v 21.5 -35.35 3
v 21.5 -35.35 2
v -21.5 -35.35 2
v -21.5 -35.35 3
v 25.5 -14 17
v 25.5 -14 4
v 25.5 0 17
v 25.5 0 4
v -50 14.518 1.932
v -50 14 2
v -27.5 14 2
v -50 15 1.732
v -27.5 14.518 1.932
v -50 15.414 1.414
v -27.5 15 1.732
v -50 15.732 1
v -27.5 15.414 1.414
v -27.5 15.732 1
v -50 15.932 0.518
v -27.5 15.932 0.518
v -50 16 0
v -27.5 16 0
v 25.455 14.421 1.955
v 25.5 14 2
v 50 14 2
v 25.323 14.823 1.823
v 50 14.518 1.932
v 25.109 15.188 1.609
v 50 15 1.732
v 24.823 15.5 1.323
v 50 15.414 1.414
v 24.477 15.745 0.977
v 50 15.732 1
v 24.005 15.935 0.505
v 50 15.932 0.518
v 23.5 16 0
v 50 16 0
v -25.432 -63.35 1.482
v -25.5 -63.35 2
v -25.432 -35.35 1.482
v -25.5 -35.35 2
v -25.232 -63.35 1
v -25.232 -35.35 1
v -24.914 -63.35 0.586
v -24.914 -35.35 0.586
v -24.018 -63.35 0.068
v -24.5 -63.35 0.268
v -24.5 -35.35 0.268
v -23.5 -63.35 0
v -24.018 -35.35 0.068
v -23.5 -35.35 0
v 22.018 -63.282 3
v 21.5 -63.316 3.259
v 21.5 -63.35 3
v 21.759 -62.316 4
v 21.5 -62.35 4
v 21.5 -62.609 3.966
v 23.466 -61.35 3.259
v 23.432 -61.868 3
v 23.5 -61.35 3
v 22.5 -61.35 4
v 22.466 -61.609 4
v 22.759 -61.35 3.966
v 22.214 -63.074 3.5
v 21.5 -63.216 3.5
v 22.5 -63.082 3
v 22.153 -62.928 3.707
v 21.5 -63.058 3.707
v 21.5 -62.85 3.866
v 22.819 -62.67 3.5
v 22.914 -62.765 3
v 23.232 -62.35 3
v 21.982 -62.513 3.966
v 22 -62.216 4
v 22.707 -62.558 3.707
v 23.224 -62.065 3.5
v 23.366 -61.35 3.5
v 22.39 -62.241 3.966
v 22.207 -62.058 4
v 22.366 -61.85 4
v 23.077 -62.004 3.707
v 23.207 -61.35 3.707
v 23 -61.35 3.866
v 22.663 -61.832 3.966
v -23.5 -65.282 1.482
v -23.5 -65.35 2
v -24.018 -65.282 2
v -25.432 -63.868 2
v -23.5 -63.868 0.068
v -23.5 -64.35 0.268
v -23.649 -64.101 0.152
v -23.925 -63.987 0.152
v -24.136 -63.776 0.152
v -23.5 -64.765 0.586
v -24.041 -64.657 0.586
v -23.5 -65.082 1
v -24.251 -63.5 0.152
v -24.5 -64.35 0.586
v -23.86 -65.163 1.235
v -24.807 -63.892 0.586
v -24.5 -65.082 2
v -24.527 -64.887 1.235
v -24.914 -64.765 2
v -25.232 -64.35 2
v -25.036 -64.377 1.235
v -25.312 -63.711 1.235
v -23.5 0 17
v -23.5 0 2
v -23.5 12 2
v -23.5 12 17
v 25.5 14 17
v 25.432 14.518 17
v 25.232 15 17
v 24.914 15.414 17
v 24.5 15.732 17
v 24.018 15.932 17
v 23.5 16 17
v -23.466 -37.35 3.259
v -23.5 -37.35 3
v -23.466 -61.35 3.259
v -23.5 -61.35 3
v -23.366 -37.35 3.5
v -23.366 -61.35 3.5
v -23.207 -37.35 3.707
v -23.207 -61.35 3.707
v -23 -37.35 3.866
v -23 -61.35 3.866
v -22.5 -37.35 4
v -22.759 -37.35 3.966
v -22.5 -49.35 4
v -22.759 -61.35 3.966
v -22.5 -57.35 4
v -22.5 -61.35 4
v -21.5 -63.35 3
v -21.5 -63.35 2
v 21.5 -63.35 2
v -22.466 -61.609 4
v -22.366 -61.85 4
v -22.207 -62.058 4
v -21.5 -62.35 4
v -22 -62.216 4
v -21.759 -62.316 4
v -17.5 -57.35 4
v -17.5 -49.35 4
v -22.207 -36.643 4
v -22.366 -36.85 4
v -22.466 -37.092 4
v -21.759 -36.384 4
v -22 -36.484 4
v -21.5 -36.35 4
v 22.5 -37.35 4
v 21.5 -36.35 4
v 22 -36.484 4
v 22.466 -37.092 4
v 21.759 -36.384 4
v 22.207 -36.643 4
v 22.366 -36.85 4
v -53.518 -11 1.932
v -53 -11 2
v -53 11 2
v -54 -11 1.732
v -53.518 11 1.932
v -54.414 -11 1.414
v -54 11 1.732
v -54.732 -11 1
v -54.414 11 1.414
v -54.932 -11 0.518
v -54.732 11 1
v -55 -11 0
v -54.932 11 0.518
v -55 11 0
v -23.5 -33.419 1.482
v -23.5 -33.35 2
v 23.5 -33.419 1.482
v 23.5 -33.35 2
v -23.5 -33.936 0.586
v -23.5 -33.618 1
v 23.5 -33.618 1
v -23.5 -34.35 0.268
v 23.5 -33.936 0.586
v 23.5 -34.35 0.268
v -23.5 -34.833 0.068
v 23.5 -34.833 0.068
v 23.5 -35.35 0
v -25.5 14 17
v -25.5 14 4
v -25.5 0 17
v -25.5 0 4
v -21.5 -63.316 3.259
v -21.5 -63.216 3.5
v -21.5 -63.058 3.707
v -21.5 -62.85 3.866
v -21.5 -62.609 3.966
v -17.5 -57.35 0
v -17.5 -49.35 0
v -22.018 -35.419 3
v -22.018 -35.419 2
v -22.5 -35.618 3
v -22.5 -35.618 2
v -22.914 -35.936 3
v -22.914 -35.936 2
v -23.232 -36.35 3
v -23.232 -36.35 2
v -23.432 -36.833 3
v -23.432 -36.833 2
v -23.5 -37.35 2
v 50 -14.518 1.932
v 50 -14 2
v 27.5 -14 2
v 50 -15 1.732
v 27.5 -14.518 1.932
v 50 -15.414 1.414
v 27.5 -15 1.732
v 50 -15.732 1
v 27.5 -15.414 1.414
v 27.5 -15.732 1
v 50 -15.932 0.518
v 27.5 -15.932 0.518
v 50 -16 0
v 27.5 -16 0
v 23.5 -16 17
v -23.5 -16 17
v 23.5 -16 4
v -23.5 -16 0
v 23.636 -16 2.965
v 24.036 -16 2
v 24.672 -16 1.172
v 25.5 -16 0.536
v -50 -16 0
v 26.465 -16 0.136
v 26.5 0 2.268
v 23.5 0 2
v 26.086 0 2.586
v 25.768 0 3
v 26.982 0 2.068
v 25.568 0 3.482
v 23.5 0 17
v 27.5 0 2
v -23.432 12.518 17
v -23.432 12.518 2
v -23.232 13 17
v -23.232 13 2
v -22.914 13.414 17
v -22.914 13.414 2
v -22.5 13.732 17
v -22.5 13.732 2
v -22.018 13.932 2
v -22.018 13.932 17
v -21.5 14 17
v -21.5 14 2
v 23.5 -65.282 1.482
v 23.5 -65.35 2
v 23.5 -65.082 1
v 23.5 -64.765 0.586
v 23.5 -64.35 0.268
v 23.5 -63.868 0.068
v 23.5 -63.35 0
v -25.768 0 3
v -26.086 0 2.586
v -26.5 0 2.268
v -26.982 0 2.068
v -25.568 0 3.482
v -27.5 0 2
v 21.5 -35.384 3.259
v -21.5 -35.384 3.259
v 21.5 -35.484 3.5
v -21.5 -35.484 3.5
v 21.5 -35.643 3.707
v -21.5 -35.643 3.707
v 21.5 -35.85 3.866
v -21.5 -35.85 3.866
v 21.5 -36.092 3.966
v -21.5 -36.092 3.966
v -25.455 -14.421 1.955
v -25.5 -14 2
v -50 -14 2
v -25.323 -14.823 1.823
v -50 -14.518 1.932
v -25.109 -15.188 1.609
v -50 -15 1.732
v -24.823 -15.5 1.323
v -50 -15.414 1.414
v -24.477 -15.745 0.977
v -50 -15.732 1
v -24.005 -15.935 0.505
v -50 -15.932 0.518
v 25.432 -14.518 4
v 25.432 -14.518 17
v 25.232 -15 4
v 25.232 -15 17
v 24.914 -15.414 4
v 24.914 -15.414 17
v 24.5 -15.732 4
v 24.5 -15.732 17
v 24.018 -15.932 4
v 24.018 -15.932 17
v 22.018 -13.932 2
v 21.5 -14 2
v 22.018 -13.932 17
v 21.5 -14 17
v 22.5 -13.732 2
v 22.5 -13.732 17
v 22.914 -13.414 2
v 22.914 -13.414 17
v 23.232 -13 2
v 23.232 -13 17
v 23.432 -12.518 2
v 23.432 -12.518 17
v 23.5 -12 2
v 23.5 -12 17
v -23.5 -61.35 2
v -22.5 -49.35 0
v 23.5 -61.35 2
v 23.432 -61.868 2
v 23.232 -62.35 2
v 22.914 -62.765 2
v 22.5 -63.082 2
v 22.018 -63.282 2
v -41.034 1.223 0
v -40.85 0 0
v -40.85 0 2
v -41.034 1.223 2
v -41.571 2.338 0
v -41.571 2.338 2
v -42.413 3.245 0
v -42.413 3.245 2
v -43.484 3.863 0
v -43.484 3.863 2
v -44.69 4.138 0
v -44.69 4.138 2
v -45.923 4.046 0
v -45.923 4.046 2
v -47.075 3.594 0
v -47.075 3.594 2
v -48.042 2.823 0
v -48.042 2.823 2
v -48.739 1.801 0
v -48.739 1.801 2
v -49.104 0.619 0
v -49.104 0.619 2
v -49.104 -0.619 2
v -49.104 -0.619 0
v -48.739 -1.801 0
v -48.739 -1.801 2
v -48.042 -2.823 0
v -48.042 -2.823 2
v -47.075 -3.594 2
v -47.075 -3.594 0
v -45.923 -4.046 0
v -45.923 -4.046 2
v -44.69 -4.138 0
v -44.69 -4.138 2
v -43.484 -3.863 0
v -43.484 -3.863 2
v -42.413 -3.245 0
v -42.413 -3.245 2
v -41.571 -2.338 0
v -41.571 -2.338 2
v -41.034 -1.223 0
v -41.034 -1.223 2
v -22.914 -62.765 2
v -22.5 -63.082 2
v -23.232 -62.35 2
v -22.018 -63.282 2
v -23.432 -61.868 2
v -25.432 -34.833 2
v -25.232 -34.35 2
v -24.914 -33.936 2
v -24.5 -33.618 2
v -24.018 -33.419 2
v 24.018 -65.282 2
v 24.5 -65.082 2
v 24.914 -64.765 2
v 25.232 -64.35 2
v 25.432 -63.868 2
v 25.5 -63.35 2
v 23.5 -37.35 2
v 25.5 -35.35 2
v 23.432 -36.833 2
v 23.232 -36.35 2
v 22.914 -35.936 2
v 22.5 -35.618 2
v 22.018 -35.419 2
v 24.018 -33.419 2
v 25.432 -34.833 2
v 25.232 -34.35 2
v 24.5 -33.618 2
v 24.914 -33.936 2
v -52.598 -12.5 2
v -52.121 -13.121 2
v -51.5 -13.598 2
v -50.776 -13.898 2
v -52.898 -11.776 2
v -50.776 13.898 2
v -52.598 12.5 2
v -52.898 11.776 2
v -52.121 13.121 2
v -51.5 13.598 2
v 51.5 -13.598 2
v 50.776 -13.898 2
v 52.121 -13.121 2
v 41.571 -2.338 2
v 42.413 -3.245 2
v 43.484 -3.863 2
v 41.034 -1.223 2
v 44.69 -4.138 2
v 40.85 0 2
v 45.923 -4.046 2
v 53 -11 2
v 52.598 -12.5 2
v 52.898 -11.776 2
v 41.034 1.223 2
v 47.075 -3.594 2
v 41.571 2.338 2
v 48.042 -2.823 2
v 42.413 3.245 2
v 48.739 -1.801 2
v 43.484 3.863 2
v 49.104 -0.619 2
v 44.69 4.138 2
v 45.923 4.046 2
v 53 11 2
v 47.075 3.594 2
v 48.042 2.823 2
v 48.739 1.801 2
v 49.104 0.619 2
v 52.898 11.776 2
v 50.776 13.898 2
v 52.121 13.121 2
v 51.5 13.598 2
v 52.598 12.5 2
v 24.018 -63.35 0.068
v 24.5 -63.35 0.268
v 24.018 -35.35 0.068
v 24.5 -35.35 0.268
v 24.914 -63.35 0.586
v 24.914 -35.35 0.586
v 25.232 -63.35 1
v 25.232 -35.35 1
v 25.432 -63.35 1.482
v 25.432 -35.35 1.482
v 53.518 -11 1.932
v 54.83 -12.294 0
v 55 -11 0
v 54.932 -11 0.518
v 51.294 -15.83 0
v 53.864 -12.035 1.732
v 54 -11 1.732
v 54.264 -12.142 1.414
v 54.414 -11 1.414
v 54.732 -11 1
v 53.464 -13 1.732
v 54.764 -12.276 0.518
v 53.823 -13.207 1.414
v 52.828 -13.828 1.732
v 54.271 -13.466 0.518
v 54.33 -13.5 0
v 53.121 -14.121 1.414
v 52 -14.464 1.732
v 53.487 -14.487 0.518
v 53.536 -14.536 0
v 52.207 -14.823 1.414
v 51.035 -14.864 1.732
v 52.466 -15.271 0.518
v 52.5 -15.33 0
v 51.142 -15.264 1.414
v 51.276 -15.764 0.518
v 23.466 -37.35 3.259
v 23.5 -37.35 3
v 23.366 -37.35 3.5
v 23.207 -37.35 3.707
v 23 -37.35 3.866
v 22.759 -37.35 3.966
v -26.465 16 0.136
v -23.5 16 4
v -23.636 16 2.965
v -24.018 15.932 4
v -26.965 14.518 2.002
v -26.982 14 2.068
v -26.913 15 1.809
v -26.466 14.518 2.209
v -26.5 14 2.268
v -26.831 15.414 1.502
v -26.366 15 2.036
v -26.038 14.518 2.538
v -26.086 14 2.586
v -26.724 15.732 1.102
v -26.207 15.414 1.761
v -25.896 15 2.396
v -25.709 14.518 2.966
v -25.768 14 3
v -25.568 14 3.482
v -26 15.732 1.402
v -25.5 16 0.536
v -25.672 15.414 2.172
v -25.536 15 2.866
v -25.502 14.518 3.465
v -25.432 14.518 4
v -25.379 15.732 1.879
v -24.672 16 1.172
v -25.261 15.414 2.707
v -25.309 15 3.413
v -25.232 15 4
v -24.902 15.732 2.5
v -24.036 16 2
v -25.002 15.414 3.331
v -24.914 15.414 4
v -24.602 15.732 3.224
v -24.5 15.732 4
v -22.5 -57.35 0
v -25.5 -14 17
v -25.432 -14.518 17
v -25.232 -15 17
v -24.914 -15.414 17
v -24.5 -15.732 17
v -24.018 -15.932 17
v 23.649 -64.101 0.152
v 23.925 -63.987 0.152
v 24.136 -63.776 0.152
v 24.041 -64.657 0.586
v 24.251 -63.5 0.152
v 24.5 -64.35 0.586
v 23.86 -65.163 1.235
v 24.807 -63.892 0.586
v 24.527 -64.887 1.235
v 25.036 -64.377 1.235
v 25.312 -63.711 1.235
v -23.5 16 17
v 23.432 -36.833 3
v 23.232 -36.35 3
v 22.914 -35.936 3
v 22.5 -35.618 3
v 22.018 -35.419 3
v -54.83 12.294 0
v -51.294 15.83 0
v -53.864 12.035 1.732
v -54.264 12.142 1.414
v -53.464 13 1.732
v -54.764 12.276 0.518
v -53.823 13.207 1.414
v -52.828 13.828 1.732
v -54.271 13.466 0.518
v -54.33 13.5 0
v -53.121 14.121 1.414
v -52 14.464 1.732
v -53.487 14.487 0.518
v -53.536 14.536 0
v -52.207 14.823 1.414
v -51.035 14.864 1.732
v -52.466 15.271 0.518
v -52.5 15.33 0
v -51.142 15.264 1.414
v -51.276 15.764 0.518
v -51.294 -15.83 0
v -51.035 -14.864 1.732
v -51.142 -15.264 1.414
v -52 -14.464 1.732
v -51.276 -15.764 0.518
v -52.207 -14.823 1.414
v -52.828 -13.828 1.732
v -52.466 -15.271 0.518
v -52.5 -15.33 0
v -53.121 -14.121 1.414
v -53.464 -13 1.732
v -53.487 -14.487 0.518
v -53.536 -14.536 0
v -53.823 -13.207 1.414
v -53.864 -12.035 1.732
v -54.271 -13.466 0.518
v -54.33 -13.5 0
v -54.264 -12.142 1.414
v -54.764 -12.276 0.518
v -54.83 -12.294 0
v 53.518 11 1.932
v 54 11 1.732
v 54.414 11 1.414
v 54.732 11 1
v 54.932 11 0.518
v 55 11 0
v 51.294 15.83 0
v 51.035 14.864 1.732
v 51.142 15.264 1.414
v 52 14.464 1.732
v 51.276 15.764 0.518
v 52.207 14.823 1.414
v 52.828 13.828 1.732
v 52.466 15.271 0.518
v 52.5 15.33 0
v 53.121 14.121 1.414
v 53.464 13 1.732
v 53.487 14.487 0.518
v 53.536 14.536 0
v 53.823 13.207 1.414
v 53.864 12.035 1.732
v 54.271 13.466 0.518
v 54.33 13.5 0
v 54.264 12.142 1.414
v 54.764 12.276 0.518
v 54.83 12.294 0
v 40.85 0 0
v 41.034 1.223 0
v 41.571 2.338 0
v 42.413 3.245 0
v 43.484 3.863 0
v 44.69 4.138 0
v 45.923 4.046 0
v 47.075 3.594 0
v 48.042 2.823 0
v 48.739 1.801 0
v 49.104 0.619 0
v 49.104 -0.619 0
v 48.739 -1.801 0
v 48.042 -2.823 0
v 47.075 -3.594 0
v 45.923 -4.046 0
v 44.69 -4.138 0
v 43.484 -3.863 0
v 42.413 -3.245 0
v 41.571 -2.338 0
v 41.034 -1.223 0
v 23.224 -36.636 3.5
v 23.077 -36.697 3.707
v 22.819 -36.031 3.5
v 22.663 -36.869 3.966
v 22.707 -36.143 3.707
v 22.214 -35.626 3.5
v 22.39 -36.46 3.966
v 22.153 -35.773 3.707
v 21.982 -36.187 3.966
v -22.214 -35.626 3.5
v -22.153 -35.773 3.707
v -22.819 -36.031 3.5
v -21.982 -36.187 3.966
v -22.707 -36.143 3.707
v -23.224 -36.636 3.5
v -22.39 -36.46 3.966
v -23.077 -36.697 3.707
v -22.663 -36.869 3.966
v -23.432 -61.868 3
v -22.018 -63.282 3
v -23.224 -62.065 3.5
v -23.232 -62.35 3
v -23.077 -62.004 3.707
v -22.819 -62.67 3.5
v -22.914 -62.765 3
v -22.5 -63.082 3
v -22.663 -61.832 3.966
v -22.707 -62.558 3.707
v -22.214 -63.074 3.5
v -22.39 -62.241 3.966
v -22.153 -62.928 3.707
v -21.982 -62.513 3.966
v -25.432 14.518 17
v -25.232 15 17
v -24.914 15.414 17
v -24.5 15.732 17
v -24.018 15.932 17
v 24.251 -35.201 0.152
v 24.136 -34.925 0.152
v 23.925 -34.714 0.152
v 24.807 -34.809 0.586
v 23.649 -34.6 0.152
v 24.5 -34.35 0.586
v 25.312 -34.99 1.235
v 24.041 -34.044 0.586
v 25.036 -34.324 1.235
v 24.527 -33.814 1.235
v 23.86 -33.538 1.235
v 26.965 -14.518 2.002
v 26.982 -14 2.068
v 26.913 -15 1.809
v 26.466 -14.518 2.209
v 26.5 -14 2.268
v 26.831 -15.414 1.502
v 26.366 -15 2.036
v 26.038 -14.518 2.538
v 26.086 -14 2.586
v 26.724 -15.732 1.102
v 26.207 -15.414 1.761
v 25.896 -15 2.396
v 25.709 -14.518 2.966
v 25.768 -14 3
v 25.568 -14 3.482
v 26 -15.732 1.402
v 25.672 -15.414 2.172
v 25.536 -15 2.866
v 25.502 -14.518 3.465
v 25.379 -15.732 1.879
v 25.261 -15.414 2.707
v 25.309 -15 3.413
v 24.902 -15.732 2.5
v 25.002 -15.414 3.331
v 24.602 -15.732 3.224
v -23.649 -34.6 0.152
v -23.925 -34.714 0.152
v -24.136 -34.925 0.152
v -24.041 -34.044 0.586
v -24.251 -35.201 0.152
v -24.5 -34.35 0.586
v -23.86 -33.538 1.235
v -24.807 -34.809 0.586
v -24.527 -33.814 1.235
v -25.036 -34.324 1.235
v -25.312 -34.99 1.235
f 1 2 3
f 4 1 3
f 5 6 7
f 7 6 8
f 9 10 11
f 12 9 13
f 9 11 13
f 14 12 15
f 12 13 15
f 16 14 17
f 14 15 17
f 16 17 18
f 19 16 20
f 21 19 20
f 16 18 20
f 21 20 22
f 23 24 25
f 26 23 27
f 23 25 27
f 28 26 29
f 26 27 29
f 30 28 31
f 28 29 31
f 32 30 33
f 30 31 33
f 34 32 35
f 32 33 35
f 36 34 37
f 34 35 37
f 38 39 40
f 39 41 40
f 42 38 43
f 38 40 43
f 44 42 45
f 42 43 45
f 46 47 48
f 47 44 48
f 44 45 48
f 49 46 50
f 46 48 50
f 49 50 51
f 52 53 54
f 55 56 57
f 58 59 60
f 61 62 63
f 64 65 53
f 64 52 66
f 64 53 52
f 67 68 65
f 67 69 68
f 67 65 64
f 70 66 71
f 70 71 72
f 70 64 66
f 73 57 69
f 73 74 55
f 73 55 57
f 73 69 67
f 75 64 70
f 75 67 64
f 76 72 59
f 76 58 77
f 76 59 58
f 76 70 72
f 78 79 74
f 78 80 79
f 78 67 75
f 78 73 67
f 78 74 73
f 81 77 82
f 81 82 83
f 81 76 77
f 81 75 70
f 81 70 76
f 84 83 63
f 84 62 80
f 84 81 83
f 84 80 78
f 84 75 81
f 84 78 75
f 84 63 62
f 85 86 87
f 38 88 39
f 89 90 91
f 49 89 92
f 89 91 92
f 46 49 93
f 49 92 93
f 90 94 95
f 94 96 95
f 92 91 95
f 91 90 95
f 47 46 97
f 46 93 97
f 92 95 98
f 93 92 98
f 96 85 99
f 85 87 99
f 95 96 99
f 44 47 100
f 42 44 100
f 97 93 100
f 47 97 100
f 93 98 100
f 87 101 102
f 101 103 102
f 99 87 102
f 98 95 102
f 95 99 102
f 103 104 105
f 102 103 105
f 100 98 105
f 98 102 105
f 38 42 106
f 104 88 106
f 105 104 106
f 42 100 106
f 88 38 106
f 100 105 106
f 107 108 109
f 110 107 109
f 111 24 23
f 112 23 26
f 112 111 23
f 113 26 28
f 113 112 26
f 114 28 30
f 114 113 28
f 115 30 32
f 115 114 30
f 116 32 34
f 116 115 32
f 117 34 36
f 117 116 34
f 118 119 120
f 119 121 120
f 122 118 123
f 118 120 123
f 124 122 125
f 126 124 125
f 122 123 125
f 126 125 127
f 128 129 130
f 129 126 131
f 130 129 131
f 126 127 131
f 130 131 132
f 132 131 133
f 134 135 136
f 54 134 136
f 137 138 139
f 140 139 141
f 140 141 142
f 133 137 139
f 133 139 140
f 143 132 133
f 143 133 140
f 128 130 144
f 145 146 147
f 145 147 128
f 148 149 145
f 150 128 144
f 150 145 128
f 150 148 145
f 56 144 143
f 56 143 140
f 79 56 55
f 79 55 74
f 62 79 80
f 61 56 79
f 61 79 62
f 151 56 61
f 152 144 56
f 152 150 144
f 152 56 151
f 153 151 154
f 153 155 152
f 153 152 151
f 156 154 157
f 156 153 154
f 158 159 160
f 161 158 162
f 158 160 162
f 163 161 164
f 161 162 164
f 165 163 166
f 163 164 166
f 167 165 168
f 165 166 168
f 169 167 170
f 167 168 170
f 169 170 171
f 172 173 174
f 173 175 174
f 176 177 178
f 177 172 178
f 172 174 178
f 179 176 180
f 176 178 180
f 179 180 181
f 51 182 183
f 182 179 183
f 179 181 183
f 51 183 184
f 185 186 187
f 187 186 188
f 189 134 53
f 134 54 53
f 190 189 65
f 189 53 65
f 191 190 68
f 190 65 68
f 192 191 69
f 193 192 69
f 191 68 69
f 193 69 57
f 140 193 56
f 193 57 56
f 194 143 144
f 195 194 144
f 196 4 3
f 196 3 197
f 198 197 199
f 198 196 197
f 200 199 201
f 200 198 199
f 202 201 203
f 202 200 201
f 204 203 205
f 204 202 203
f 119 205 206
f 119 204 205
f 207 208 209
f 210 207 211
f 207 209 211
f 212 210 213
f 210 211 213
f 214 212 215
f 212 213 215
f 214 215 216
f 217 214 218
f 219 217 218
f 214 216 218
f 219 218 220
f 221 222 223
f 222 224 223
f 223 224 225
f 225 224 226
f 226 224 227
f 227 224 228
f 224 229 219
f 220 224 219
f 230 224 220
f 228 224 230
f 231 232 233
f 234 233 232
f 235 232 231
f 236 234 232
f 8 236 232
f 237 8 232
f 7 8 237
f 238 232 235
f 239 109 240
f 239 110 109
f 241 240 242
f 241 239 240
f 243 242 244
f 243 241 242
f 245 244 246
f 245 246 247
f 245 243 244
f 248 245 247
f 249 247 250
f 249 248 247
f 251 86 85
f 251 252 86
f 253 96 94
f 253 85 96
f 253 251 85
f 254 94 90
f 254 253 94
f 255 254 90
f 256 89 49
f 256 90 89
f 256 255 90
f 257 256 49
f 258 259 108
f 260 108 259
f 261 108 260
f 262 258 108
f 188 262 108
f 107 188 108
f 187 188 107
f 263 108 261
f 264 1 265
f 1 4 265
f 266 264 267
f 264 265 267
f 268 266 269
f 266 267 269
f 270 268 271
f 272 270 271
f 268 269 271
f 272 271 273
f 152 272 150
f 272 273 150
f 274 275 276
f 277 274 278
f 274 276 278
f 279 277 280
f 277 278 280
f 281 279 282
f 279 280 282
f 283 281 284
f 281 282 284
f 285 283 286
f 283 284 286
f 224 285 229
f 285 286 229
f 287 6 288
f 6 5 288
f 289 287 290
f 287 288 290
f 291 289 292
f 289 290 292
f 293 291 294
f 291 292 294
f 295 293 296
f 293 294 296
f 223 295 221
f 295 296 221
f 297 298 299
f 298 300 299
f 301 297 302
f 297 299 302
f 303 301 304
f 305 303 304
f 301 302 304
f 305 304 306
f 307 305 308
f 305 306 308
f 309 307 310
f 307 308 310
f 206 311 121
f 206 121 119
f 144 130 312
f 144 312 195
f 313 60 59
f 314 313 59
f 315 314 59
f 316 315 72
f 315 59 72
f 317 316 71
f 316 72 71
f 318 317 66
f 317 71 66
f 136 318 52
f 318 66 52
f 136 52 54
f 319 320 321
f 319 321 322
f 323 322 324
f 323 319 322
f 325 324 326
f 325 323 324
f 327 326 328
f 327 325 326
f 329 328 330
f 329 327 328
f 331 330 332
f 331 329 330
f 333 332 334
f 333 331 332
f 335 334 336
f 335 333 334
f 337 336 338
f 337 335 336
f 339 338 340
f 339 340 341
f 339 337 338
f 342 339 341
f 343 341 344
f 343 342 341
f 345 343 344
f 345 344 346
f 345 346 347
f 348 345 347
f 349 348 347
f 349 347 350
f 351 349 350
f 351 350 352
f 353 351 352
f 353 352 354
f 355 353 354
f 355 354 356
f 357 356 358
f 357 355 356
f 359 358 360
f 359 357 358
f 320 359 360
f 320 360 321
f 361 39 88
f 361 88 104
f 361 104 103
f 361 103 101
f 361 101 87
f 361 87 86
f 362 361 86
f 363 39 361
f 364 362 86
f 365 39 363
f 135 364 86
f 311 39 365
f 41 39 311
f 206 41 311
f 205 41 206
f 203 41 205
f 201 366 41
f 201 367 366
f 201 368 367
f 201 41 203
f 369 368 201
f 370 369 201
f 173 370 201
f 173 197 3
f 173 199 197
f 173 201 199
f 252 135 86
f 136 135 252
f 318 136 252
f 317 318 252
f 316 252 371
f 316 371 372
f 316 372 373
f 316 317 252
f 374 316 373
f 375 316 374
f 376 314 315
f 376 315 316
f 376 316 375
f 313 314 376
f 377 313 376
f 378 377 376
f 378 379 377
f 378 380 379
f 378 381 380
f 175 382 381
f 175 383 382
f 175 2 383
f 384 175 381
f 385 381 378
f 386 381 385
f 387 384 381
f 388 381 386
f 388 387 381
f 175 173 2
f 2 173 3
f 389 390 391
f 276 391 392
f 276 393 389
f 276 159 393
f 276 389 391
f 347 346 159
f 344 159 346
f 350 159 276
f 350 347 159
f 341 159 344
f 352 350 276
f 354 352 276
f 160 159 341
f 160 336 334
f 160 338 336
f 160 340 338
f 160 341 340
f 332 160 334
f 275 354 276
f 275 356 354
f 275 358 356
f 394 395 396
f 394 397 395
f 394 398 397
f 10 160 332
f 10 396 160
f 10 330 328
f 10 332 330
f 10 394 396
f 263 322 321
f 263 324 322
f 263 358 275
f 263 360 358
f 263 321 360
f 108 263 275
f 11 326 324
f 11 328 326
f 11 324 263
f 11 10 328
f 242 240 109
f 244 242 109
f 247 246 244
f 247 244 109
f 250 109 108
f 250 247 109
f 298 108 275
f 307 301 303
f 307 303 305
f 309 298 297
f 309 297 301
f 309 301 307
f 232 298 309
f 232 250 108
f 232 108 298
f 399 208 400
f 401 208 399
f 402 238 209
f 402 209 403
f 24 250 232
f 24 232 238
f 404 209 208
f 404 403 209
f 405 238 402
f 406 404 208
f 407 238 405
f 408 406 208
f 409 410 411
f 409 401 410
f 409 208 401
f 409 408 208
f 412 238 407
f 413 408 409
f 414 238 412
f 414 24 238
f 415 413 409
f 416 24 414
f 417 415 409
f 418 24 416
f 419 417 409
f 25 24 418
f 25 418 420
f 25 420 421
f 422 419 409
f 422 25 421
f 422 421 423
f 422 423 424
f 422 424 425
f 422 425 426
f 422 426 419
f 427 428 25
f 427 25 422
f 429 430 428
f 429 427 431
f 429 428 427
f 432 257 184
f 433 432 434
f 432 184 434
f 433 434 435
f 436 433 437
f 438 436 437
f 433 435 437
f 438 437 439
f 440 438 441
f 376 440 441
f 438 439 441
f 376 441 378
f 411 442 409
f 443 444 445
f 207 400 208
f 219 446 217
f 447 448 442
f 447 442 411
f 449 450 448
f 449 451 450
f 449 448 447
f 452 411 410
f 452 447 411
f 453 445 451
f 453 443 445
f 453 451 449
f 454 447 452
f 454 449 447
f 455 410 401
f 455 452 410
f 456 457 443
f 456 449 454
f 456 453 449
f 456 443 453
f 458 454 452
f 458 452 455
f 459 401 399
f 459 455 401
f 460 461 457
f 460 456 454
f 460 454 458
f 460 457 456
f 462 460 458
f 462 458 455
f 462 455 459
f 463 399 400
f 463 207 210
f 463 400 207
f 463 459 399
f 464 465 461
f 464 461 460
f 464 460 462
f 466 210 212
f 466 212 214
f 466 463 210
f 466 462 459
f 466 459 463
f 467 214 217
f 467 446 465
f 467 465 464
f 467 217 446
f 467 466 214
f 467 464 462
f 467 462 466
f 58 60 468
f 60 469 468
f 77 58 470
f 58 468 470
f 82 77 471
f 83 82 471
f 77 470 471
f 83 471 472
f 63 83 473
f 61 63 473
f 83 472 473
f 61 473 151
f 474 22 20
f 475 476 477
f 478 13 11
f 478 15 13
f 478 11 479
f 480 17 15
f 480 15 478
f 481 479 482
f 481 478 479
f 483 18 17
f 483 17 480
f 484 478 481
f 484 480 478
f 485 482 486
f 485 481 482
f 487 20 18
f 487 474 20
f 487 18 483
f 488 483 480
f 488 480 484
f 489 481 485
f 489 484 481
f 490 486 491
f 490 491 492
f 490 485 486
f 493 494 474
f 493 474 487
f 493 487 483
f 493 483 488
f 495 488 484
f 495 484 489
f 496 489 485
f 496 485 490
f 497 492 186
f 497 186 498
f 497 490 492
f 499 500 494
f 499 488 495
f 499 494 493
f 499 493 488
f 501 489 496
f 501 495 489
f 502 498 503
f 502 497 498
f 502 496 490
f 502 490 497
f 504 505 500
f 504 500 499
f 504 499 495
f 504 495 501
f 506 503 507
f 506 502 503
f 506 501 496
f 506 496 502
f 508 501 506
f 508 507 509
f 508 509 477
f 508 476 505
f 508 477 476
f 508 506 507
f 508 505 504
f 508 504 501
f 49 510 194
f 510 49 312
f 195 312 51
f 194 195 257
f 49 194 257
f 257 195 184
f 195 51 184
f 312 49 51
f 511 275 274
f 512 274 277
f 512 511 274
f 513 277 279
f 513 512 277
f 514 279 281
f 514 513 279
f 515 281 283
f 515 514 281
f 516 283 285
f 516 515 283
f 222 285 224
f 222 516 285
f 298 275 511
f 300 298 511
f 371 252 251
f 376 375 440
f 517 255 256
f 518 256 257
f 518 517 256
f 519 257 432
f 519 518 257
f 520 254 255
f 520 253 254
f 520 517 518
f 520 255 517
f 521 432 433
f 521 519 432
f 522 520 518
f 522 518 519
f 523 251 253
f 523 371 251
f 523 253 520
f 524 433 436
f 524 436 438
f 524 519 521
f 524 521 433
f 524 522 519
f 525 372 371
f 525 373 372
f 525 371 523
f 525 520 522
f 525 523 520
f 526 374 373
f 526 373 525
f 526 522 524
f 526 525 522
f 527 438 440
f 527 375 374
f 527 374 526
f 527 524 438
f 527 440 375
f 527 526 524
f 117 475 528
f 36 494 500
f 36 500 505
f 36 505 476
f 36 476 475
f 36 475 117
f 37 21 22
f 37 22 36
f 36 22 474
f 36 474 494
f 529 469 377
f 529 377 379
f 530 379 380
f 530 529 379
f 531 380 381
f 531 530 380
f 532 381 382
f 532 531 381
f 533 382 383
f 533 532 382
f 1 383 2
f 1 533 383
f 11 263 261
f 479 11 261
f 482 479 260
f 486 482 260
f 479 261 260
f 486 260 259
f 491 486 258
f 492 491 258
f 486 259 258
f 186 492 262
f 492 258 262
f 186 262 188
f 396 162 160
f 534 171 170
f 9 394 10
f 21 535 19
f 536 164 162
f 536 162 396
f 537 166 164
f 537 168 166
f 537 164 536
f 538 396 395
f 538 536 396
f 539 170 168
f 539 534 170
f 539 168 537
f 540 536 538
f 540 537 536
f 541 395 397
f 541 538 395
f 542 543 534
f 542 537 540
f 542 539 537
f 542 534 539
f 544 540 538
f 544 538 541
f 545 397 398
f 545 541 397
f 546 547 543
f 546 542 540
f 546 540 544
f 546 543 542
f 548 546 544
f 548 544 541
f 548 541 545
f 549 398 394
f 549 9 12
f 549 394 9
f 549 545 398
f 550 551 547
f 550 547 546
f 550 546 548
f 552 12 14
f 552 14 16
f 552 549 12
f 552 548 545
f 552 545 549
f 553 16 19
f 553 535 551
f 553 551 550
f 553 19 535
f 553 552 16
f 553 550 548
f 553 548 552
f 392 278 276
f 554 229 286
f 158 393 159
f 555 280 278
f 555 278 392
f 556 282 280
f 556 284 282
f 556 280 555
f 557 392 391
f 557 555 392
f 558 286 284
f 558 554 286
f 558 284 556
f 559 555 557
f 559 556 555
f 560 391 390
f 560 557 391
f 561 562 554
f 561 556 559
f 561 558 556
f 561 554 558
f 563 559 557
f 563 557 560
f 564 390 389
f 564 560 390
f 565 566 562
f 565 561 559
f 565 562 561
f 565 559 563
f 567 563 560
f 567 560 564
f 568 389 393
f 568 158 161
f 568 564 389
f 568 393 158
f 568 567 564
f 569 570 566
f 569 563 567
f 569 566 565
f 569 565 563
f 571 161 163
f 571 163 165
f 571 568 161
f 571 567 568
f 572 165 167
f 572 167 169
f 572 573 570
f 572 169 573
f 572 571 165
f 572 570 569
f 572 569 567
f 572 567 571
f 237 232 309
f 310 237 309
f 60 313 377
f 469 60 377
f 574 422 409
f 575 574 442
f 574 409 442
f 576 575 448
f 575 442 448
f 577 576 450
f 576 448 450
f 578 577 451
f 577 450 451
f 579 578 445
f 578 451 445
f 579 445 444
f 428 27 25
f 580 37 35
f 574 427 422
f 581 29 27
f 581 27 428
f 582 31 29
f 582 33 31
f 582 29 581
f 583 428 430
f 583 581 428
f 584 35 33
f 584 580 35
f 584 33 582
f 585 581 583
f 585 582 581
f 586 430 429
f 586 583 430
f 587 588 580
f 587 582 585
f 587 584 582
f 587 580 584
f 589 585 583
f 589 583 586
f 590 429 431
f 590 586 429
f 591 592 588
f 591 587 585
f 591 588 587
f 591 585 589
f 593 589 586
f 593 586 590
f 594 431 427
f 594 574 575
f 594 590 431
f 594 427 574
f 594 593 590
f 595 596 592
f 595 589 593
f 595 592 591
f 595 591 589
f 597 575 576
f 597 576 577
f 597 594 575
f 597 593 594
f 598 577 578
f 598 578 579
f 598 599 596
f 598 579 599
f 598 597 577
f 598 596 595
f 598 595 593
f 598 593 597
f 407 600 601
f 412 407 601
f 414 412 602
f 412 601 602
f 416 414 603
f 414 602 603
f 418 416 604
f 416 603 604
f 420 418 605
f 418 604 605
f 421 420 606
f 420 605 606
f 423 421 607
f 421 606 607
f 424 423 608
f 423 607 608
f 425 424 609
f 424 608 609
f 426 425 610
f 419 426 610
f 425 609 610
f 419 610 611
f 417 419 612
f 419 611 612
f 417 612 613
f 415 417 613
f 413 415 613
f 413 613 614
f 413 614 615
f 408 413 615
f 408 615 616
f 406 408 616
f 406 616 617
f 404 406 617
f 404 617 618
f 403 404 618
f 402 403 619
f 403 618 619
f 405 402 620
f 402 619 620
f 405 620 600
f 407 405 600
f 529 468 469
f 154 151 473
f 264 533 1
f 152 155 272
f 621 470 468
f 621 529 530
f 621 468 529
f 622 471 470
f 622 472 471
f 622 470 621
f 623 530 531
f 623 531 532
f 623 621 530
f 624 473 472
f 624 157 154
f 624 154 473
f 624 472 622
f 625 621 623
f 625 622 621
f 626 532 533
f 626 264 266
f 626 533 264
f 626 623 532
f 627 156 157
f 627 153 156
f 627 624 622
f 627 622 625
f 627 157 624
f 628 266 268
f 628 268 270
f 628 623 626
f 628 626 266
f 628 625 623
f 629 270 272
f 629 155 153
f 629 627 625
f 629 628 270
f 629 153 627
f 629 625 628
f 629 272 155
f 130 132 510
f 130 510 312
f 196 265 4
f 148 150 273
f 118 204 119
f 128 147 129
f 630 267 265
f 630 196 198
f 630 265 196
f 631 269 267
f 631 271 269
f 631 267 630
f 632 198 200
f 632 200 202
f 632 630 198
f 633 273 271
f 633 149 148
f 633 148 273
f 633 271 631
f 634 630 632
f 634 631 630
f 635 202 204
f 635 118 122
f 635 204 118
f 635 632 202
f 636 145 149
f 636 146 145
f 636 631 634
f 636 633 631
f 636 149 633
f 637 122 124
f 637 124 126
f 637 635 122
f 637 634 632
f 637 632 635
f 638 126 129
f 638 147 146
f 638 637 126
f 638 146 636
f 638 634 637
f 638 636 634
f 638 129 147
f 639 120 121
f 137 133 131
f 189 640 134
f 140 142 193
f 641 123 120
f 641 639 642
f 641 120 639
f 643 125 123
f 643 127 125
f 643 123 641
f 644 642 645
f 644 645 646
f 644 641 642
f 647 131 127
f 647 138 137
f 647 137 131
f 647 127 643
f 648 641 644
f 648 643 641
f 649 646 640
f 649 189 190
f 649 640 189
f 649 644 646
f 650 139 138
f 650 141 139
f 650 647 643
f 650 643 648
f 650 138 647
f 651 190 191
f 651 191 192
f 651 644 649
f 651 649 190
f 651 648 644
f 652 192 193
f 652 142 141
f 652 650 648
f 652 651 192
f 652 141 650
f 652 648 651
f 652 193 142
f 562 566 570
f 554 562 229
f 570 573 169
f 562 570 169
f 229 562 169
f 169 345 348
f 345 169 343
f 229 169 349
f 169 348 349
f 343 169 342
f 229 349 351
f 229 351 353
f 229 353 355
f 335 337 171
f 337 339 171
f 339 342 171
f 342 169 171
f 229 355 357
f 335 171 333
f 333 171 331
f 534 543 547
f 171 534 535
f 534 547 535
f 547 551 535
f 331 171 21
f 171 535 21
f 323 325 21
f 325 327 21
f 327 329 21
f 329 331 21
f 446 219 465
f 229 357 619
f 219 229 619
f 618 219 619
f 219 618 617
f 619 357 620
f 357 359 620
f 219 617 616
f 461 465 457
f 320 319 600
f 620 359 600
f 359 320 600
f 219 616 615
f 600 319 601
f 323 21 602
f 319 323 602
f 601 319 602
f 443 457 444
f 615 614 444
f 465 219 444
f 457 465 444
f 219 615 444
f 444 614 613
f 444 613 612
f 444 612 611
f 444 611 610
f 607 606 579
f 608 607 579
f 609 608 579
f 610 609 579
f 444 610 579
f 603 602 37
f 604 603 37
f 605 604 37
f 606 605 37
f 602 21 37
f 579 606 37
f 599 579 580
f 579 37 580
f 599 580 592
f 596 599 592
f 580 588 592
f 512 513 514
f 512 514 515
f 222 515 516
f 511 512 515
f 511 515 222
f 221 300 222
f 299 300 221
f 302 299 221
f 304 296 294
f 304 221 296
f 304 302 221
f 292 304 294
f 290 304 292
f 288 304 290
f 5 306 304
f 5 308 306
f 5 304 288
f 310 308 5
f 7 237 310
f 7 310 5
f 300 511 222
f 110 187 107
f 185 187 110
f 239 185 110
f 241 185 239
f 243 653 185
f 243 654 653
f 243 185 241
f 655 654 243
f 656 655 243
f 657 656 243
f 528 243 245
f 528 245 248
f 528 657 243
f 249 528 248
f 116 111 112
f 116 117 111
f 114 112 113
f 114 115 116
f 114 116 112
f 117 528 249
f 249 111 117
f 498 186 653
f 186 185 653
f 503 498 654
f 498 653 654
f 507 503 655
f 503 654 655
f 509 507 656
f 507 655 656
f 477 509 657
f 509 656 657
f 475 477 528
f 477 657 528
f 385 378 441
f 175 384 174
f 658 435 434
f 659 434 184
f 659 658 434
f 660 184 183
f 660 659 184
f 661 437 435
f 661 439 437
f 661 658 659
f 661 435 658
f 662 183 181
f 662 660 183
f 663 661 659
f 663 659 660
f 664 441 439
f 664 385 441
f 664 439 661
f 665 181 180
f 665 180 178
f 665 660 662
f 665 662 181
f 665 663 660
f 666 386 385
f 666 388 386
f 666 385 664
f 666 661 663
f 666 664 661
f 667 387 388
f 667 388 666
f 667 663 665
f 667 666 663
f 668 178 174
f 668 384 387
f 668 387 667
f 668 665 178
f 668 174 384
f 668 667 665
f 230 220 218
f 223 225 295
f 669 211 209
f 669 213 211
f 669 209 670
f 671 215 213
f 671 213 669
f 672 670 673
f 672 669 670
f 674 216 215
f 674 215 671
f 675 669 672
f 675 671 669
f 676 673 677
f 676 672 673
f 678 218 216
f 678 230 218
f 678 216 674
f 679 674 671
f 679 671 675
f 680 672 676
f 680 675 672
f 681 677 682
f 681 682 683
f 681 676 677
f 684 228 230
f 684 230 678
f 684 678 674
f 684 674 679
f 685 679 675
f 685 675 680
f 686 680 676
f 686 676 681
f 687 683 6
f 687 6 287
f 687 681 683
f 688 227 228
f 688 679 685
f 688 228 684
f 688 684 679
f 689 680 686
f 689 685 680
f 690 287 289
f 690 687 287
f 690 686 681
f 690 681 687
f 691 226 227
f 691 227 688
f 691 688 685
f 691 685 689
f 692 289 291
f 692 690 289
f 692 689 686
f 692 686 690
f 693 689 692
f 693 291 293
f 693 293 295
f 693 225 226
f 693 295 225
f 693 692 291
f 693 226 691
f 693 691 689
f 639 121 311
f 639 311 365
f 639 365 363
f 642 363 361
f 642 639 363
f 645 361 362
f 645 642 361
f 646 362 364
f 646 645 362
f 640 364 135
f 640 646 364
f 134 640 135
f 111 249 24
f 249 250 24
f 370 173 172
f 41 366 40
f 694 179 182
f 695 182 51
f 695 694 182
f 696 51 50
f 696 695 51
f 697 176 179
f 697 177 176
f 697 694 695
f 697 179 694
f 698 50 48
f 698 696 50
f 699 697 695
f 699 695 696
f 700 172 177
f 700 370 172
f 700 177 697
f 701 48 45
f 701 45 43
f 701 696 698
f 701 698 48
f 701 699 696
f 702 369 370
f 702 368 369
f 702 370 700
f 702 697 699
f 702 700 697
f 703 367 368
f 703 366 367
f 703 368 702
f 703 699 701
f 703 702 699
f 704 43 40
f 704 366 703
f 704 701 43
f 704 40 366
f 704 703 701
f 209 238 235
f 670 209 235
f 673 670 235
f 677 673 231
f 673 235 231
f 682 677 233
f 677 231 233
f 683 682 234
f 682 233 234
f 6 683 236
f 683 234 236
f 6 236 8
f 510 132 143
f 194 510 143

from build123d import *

# Parameters (mm, degrees)
F0_W      = 110
F0_H      = 32
F0_R      = 4.15
F1_DEPTH  = 2
F2_W      = 23.5
F2_H      = 2
F3_DEPTH  = 15
F4_W      = 14
F4_H      = 15
F5_DEPTH  = 2
F6_W      = 14
F6_H      = 15
F7_DEPTH  = 2
F8_R      = 5
F9_F1_R   = 2
F9_F2_R   = 1.9999
F10_W     = 51
F10_H     = 32
F10_W_2   = 47
F10_H_2   = 28
F11_DEPTH = 2
F12_W     = 23.5
F12_H     = 28
F13_DEPTH = 2
F14_R     = 1.99999
F15_R     = 1
F16_W     = 5
F16_H     = 8
F17_DEPTH = 25


# Not quite as in the source:
# - a fillet or chamfer is up to 0.001 mm smaller than in the source, because OpenCascade refuses the exact size


with BuildPart() as f1:
    # F0 (on Top) → F1 (new body)
    with BuildSketch(Plane.XY):
        Rectangle(F0_W, F0_H)
        with Locations((-45, 0)):
            Circle(F0_R, mode=Mode.SUBTRACT)
        with BuildLine():
            ThreePointArc((49.15, 0), (45, -4.15), (40.85, 0))
            ThreePointArc((40.85, 0), (45, 4.15), (49.15, 0))
        make_face(mode=Mode.SUBTRACT)
    extrude(amount=F1_DEPTH)

    # F2 (on face) → F3 (join)
    with BuildSketch(Plane.XY.offset(2)):
        with Locations((-11.75, -15)):
            Rectangle(F2_W, F2_H)
        with Locations((11.75, -15)):
            Rectangle(F2_W, F2_H)
        Polygon((23.5, -14), (23.5, -16), (25.5, -16), (25.5, 16), (23.5, 16), (23.5, 14), align=None)
        Polygon((-25.5, -16), (-23.5, -16), (-23.5, -14), (-23.5, 14), (-23.5, 16), (-25.5, 16), align=None)
        with Locations((-11.75, 15)):
            Rectangle(F2_W, F2_H)
        with Locations((11.75, 15)):
            Rectangle(F2_W, F2_H)
    extrude(amount=F3_DEPTH)

    # F4 (on face) → F5 (cut, through all)
    with BuildSketch(Plane(origin=(-25.5, 0, 0), x_dir=(0, -1, 0), z_dir=(-1, 0, 0))):
        with Locations((7, 9.5)):
            Rectangle(F4_W, F4_H)
    extrude(amount=-F5_DEPTH, mode=Mode.SUBTRACT)

    # F6 (on face) → F7 (cut, through all)
    with BuildSketch(Plane.YZ.offset(25.5)):
        with Locations((7, 9.5)):
            Rectangle(F6_W, F6_H)
    extrude(amount=-F7_DEPTH, mode=Mode.SUBTRACT)

    # F8
    f8_edges = [f1.edges().sort_by_distance(p)[0] for p in [
        (-55, -16, 1),
        (-55, 16, 1),
        (55, -16, 1),
        (55, 16, 1),
    ]]
    fillet(f8_edges, radius=F8_R)

    # F9: fillet of radius 2 on 8 edges, made by hand

    # F9_f1
    f9_f1_edges = [f1.edges().sort_by_distance(p)[0] for p in [
        (23.5, -14, 9.5),
        (-23.5, 14, 9.5),
        (-25.5, 8, 2),
        (25.5, -8, 2),
    ]]
    fillet(f9_f1_edges, radius=F9_F1_R)

    # F9_f2 (radius 2 in the source; OpenCascade refuses exactly that, so slightly less here)
    f9_f2_edges = [f1.edges().sort_by_distance(p)[0] for p in [
        (25.5, -16, 10.5),
        (-25.5, 16, 10.5),
        (25.5, 16, 9.5),
        (-25.5, -16, 9.5),
        (-26.0857864376, 16, 2.5857864376),
        (26.0857864376, -16, 2.5857864376),
    ]]
    fillet(f9_f2_edges, radius=F9_F2_R)


with BuildPart() as f11:
    # F10 (on Top) → F11 (new body)
    with BuildSketch(Plane.XY):
        with Locations((0, -49.3504135075)):
            Rectangle(F10_W, F10_H)
        with Locations((0, -49.3504135075)):
            Rectangle(F10_W_2, F10_H_2, mode=Mode.SUBTRACT)
        with Locations((0, -49.3504135075)):
            Rectangle(F10_W_2, F10_H_2)
    extrude(amount=F11_DEPTH)

    # F12 (on face) → F13 (join)
    with BuildSketch(Plane.XY.offset(2)):
        with Locations((11.75, -49.3504135075)):
            Rectangle(F12_W, F12_H)
        with Locations((-11.75, -49.3504135075)):
            Rectangle(F12_W, F12_H)
    extrude(amount=F13_DEPTH)

    # F14 (radius 2 in the source; OpenCascade refuses exactly that, so slightly less here)
    f14_edges = [f11.edges().sort_by_distance(p)[0] for p in [
        (-23.5, -63.350414, 3),
        (-25.5, -65.350414, 1),
        (23.5, -63.350414, 3),
        (23.5, -35.350414, 3),
        (-23.5, -35.350414, 3),
        (-25.5, -33.350414, 1),
        (25.5, -33.350414, 1),
        (25.5, -65.350414, 1),
        (0, -65.350414, 0),
        (25.5, -49.350414, 0),
        (0, -33.350414, 0),
        (-25.5, -49.350414, 0),
    ]]
    fillet(f14_edges, radius=F14_R)

    # F15
    f15_edges = [f11.edges().sort_by_distance(p)[0] for p in [
        (23.5, -49.350414, 4),
        (22.914216, -62.76463, 4),
        (22.914216, -35.936197, 4),
        (0, -63.350414, 4),
        (0, -35.350414, 4),
        (-22.914216, -62.76463, 4),
        (-22.914216, -35.936197, 4),
        (-23.5, -49.350414, 4),
    ]]
    fillet(f15_edges, radius=F15_R)

    # F16 (on face) → F17 (cut)
    with BuildSketch(Plane.XY.offset(4)):
        with Locations((-20, -53.3504135075)):
            Rectangle(F16_W, F16_H)
    extrude(amount=-F17_DEPTH, mode=Mode.SUBTRACT)


solid = Compound([f1.part, f11.part])
